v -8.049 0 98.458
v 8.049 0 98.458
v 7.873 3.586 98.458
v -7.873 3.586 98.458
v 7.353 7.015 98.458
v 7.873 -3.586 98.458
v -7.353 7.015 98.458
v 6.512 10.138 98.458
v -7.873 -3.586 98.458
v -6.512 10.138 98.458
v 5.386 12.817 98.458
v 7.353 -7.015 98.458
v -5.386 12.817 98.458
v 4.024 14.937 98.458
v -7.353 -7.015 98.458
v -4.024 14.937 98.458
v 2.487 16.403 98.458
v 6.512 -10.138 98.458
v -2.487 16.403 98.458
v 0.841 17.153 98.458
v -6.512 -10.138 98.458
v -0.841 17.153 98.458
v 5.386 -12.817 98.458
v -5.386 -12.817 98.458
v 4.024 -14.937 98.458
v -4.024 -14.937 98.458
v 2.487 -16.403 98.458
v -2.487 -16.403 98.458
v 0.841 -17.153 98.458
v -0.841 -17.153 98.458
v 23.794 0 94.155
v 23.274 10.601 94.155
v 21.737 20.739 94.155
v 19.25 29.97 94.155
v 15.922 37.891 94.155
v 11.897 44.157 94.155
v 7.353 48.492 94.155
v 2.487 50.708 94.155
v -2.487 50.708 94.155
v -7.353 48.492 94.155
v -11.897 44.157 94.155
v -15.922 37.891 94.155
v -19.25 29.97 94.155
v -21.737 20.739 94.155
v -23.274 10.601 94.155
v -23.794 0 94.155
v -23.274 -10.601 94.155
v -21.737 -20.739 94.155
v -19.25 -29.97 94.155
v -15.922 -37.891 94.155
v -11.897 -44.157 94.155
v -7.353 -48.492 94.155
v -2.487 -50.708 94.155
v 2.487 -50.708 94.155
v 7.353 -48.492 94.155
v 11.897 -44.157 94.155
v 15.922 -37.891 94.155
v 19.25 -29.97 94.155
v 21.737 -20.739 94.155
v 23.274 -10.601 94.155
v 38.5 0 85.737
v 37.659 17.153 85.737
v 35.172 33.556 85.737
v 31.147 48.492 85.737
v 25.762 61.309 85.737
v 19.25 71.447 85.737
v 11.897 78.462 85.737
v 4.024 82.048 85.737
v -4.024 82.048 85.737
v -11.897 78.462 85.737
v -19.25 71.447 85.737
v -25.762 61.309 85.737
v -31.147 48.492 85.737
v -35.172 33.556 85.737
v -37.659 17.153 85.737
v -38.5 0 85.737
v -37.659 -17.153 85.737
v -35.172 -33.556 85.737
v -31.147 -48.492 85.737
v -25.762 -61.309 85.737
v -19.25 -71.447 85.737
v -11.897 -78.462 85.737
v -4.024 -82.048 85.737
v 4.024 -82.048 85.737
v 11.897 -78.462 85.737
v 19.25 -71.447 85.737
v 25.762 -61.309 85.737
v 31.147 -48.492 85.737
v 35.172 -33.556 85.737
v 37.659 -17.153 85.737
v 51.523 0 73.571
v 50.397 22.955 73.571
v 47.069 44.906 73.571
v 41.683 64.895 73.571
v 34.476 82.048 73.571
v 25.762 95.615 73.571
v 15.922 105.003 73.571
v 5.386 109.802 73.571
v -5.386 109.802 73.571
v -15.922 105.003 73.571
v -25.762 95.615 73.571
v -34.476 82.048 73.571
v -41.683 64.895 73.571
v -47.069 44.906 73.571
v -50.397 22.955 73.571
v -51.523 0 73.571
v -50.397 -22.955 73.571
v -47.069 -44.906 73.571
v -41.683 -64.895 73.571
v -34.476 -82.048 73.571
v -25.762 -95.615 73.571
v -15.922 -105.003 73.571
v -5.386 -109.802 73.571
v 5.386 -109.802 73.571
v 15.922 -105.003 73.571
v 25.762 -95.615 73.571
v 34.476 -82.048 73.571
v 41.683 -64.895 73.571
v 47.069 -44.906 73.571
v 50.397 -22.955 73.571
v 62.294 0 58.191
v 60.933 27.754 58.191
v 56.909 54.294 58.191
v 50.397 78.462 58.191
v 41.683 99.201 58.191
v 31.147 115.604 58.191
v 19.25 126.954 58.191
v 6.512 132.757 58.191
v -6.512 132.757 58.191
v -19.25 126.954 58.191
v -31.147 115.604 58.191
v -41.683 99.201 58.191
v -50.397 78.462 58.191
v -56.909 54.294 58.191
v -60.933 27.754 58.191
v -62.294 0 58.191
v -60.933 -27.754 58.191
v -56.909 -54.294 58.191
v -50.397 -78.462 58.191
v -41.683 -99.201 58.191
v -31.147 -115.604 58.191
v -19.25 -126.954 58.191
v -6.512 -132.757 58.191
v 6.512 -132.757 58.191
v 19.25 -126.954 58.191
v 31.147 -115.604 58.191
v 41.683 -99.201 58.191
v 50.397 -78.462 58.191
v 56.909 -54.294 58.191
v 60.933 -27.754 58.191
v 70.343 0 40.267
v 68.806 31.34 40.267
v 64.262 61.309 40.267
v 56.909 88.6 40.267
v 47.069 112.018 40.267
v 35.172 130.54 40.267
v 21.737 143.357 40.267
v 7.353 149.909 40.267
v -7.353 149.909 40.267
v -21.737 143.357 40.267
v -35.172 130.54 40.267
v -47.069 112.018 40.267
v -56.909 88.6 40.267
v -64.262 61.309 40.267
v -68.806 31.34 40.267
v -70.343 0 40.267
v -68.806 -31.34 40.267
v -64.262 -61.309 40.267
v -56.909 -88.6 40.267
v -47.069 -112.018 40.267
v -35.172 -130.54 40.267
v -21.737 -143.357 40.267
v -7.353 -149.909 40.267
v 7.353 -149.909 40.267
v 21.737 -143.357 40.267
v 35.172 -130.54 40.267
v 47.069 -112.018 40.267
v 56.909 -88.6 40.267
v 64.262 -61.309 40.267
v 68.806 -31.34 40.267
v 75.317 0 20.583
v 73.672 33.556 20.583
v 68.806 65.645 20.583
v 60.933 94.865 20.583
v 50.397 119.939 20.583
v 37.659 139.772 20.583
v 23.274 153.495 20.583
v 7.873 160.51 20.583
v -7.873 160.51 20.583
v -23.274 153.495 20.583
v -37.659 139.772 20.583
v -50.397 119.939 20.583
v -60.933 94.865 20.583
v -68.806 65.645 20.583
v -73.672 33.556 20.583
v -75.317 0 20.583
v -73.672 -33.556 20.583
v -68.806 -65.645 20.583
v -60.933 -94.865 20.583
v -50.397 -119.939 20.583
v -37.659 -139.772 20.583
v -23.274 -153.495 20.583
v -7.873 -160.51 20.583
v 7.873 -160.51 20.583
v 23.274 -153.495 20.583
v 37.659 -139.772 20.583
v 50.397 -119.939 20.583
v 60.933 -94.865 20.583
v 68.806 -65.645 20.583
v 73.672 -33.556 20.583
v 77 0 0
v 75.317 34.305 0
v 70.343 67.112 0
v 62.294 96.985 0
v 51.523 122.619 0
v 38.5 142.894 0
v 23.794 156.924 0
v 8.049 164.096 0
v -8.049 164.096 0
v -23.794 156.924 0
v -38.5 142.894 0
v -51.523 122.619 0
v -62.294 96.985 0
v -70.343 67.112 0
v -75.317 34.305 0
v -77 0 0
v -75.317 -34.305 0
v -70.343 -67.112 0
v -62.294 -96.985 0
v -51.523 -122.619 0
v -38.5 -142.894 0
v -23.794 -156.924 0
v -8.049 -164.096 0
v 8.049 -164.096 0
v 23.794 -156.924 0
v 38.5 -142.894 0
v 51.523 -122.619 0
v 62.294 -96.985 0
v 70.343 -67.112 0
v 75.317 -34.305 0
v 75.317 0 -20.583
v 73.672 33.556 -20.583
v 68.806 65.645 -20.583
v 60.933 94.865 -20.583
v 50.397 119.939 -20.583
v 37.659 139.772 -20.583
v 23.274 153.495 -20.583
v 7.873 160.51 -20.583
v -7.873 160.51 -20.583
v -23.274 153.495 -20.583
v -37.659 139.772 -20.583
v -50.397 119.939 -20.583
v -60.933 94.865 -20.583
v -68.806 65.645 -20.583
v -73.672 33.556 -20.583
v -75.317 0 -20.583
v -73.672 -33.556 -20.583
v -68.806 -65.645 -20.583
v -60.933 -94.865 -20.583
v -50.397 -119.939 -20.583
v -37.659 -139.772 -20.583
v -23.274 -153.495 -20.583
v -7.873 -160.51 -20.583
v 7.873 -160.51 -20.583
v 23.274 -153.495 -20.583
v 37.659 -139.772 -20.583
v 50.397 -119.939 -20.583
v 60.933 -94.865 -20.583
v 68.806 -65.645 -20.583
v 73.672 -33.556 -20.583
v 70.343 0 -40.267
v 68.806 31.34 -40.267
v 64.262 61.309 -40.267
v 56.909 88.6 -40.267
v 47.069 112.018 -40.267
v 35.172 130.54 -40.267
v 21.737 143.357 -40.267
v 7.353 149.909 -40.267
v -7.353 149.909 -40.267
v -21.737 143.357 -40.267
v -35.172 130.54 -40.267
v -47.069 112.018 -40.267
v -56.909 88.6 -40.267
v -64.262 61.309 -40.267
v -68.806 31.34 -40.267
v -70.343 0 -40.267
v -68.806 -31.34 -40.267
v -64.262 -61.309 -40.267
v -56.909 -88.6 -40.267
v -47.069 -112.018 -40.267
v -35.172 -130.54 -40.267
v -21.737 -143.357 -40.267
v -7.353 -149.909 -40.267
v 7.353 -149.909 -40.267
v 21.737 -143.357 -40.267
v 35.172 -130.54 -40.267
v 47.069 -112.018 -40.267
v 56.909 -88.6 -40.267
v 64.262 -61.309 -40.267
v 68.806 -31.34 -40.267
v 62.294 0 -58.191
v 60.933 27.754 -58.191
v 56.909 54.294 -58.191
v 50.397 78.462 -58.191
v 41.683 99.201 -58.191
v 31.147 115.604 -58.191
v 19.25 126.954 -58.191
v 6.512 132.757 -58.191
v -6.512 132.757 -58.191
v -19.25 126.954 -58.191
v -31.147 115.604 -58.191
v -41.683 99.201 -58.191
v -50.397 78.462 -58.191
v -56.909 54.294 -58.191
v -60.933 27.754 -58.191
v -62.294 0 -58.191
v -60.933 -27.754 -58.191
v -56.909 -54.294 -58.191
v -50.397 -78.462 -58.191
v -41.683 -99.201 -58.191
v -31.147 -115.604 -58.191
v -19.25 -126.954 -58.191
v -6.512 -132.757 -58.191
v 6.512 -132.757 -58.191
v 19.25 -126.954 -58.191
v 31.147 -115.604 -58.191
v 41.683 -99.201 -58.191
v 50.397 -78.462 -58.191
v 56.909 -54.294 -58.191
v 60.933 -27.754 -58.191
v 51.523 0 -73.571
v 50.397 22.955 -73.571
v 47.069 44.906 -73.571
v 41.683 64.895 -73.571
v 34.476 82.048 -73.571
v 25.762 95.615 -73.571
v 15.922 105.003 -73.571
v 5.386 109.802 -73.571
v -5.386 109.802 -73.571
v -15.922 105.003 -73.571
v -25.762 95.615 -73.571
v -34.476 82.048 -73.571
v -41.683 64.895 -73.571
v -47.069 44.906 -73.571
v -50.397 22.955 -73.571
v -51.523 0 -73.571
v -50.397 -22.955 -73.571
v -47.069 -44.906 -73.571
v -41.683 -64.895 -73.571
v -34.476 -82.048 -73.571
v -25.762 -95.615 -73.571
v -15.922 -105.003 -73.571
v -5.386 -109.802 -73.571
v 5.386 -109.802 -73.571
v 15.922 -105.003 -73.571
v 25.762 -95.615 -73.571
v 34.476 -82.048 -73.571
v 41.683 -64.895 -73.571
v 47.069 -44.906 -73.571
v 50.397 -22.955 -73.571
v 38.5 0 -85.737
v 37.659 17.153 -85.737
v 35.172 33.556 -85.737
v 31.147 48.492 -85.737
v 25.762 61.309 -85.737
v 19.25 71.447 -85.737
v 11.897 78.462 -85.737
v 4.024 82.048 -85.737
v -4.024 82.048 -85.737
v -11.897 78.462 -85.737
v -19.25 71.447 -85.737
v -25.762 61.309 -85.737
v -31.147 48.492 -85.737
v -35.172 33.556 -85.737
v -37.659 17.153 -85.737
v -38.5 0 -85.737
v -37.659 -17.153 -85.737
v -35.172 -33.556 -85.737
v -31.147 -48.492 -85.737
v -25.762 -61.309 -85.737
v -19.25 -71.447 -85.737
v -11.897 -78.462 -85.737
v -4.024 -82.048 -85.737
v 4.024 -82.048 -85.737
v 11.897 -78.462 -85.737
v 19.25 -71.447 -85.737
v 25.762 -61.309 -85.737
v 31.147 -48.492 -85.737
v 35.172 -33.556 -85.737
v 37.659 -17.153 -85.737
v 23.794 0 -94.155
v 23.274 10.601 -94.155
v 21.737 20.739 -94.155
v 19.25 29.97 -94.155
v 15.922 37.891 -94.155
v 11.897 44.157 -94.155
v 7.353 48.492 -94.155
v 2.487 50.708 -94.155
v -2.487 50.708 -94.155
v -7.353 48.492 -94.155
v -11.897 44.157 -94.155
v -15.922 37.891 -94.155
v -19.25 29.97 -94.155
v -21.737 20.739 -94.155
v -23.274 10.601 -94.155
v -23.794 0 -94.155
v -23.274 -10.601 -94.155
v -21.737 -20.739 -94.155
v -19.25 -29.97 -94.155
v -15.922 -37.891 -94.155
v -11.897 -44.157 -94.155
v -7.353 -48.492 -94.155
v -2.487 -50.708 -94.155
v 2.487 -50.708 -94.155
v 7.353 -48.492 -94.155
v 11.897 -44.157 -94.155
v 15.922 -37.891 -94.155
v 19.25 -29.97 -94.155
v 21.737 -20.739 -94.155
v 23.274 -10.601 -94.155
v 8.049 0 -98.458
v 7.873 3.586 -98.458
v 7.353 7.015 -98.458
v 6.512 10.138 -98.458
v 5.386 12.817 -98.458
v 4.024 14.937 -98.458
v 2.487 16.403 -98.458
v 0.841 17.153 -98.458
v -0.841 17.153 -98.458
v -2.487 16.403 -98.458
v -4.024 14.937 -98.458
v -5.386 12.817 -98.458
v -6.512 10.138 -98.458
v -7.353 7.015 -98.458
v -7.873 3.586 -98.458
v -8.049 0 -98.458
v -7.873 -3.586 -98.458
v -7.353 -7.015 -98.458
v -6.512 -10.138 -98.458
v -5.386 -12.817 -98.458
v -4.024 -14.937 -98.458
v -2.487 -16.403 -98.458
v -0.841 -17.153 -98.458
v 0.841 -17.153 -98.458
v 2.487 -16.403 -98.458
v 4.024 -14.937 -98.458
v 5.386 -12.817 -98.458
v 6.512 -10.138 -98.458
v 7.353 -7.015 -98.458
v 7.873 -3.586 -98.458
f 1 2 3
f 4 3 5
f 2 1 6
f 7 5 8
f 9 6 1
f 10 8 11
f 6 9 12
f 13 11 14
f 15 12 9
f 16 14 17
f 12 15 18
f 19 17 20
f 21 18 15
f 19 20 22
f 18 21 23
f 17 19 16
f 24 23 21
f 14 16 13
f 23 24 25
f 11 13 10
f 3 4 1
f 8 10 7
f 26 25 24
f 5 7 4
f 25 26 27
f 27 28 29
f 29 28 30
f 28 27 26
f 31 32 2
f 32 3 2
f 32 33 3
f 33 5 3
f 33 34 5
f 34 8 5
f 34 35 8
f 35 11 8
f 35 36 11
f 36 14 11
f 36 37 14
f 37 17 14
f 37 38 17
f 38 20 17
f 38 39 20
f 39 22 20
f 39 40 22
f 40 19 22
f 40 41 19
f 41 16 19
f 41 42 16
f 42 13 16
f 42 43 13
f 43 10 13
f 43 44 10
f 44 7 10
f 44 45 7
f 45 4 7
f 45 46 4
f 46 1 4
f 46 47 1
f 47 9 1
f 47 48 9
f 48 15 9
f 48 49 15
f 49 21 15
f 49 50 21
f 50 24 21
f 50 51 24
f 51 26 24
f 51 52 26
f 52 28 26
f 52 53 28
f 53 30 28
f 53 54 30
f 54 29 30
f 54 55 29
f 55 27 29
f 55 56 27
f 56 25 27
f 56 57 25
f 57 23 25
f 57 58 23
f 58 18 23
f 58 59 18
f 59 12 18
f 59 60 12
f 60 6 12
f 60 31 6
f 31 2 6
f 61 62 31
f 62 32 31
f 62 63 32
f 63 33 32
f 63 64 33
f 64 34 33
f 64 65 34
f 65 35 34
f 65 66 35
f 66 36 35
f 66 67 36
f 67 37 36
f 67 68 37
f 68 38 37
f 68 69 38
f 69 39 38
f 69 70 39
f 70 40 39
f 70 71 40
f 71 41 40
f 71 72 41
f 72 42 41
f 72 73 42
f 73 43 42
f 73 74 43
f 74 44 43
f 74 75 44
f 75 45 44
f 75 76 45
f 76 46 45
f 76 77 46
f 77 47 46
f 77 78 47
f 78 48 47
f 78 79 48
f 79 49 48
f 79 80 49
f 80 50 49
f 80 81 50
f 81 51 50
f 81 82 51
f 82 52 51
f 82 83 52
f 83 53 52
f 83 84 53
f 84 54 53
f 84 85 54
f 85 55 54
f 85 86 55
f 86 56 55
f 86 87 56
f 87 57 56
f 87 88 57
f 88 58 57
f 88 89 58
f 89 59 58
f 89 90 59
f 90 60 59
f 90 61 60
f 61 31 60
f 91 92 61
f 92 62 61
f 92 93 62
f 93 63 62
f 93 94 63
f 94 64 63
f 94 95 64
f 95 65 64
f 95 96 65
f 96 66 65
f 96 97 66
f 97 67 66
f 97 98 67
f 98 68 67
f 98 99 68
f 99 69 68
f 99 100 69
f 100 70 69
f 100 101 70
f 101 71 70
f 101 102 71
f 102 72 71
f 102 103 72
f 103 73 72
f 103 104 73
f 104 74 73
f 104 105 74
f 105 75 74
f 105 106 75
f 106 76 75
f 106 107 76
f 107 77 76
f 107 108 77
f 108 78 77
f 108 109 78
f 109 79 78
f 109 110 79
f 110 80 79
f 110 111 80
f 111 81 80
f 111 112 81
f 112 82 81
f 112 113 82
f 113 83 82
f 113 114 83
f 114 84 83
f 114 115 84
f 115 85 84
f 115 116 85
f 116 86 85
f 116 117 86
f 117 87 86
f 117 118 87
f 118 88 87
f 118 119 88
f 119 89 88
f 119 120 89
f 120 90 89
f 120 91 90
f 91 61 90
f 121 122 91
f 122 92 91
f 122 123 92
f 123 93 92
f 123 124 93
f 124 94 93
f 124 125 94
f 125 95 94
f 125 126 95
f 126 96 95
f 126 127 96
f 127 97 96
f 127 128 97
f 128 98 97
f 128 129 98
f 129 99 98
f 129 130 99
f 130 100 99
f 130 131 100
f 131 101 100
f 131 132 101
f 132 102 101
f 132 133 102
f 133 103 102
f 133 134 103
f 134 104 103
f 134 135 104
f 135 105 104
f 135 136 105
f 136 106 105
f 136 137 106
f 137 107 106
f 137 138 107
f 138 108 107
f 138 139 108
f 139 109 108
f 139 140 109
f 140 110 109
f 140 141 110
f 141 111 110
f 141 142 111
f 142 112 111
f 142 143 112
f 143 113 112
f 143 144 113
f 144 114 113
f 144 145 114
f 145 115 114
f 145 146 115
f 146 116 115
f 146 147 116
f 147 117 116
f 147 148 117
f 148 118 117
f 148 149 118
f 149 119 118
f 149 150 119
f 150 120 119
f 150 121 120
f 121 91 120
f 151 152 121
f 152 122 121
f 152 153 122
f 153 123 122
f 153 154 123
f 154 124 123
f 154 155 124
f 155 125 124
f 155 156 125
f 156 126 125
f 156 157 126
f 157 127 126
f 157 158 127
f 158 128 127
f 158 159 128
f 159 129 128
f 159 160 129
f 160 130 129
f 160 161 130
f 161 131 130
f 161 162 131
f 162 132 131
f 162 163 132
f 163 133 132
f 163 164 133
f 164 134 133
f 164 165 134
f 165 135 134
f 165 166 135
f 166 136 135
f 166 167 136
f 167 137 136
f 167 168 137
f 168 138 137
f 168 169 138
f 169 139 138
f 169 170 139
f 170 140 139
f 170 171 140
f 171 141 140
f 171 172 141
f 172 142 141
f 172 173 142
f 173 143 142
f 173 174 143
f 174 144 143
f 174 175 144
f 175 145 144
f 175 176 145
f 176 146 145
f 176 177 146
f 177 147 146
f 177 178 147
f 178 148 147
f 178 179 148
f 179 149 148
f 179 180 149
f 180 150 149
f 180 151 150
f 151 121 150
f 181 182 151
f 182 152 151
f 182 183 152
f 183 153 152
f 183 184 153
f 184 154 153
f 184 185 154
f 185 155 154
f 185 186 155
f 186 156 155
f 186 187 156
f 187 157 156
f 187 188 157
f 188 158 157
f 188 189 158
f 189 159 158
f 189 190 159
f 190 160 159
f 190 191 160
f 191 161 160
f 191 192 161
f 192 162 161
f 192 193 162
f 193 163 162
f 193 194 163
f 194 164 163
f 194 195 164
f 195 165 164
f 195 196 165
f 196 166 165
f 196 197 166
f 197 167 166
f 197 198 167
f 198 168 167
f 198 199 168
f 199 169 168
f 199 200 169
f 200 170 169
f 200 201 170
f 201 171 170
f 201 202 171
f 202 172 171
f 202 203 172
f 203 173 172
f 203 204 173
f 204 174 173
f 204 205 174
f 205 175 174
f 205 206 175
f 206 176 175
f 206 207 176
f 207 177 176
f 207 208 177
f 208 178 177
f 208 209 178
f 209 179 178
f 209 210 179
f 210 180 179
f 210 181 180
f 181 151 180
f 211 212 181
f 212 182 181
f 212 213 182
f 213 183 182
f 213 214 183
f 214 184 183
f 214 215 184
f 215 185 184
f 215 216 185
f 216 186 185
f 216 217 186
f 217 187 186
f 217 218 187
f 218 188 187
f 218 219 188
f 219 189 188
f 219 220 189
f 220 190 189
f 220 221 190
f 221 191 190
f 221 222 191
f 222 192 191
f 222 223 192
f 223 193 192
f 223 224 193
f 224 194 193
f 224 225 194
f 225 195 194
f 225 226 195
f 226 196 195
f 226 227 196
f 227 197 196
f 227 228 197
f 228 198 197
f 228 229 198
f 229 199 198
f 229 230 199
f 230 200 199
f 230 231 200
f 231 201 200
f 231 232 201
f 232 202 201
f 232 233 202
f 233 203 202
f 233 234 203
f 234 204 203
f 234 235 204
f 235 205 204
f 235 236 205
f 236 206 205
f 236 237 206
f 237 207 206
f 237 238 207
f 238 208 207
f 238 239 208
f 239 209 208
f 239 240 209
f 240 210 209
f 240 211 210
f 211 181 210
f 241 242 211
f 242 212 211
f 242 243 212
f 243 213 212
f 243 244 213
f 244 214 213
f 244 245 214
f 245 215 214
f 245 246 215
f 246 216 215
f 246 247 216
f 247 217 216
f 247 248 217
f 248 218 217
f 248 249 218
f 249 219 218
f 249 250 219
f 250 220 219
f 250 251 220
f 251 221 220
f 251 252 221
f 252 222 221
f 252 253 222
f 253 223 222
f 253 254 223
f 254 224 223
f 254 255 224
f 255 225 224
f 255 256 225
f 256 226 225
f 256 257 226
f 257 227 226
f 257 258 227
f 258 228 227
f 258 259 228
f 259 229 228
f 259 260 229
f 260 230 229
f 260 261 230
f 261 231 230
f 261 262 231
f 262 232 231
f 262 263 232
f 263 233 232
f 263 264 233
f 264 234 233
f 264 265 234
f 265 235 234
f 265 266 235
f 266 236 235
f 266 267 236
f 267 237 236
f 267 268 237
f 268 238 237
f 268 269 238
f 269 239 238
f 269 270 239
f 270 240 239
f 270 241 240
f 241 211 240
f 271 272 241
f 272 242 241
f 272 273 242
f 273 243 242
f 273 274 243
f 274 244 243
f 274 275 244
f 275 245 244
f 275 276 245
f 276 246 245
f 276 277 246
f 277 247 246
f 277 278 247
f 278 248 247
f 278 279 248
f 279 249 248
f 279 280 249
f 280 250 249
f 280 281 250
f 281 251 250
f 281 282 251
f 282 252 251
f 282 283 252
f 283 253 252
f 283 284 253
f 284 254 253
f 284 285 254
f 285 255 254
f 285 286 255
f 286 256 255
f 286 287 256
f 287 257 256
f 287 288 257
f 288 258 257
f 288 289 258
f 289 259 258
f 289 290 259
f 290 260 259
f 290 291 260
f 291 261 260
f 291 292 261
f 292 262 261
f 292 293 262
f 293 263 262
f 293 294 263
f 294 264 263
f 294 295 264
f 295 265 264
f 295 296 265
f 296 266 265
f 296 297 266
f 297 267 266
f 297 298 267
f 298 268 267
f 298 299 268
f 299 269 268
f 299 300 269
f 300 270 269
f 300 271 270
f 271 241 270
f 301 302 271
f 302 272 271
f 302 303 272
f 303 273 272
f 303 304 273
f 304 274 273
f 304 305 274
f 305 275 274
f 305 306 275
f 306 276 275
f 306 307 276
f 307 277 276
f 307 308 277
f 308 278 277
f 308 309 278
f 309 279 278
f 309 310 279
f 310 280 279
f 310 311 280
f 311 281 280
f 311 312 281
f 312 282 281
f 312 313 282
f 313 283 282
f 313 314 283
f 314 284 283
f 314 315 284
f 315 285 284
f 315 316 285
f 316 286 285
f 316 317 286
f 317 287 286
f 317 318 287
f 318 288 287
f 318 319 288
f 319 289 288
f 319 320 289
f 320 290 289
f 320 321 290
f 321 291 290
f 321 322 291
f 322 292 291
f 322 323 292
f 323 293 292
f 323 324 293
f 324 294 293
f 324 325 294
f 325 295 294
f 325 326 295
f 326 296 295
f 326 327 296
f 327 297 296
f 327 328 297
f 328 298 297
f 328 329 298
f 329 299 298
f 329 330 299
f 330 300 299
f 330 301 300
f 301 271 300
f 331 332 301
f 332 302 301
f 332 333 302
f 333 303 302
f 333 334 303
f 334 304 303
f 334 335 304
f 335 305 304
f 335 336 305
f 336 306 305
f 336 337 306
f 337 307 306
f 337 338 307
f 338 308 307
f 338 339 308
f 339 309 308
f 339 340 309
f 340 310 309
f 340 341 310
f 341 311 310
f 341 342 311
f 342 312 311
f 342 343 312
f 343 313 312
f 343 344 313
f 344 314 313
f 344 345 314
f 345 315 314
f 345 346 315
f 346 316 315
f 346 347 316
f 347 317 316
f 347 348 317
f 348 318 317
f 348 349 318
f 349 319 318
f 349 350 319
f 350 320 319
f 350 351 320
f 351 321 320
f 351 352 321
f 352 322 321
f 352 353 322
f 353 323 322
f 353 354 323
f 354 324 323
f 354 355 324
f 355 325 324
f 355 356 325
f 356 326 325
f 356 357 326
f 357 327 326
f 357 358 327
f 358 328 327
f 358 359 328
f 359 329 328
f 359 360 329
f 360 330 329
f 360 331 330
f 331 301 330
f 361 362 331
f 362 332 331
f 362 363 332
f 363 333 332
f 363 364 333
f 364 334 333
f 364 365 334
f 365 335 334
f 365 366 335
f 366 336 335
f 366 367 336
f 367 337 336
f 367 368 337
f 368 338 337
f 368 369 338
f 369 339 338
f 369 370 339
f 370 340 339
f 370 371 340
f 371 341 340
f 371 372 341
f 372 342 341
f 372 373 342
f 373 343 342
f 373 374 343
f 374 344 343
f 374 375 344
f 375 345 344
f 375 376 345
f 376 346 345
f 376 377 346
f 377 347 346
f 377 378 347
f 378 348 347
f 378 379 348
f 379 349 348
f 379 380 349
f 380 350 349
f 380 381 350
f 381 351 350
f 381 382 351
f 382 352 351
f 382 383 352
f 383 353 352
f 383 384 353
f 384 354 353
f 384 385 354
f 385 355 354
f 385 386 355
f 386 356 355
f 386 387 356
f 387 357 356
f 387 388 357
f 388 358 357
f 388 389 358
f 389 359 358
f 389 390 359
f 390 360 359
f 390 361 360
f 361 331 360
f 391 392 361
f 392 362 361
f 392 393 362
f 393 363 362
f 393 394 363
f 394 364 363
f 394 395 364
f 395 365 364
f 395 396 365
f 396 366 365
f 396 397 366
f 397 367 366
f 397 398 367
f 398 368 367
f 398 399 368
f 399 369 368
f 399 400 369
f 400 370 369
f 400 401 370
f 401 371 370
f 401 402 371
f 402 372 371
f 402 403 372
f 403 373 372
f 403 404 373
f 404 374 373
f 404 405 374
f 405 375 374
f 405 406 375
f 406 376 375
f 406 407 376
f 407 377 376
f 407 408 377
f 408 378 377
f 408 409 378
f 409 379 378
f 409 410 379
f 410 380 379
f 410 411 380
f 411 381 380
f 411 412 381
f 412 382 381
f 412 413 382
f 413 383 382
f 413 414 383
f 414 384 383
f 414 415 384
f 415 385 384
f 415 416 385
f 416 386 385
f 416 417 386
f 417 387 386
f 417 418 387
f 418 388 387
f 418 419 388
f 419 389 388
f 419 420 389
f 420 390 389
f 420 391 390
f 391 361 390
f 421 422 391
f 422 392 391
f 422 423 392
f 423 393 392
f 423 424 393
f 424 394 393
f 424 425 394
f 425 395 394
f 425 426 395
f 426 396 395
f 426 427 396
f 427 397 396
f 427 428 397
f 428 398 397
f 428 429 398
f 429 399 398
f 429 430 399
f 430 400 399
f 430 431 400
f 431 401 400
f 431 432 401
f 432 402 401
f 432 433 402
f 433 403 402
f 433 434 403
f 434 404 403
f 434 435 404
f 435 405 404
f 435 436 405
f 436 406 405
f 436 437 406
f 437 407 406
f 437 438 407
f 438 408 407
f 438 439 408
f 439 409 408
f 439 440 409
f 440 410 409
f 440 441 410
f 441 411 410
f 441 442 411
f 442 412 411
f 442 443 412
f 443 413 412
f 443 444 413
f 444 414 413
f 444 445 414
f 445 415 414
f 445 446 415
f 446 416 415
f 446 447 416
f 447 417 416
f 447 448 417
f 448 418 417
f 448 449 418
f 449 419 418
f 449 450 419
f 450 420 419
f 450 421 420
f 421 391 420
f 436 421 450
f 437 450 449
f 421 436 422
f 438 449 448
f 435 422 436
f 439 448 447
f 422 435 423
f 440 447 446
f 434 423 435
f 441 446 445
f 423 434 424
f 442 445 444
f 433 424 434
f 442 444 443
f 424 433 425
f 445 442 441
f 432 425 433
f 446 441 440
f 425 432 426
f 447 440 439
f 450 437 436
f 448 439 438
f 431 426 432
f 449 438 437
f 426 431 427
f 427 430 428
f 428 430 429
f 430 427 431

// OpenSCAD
// Generated by SolidPython 1.0.1 on 2020-07-29 00:46:48


scale(v = [7, 15, 9]) {
	sphere(r = 11);
}
/***********************************************
*********      SolidPython code:      **********
************************************************
 
# import packages: SolidPython
from solid import *
from solid.utils import *
from itertools import chain, combinations, permutations


class Resize:

    def __init__(self, scad_file):
        self.scad_file = scad_file
        #self.scad_file = import_scad(scad_file)
        # cone/cylinder param:
        self.r1 = 0
        self.r2 = 0
        self.h = 0
        # rectangular prism param:
        self.w = 0
        self.l = 0
        # ellipse param:
        self.r = 0

    # import OpenScad code (file name corresponds to shape)


    # classify shape + parameters
    def assign(self, param1, param2, param3):
        if self.scad_file == 'cone.scad':
            self.r1 = param1
            self.r2 = param2
            self.h = param3
        elif self.scad_file == 'cylinder.scad':
            self.r1 = param1
            self.r2 = param2
            self.h = param3
        elif self.scad_file == 'rectangularPrism.scad':
            self.h = param1
            self.l = param2
            self.w = param3
        else:
            self.r = param1
            self.h = param2

    # resize parameters
    def iterate(self):
        x = range(3, 20, 2)
        i = 1
        if self.scad_file == 'cone.scad':
            tempList = list(permutations(x, 2))
            for temp in tempList:
                param1 = temp[0]
                param2 = temp[1]
                filepath = 'produced_scad_files/' + 'cone' + str(param1) + '_' + str(param2) + '_' + '.scad'
                scad_render_to_file(cylinder(h=param1, r1=param2, r2=0), filepath)

        elif self.scad_file == 'cylinder.scad':
            tempList = list(permutations(x, 3))
            for temp in tempList:
                param1 = temp[0]
                param2 = temp[1]
                filepath = 'produced_scad_files/' + 'cylinder' + str(param1) + '_' + str(param2) + '_' + '.scad'
                scad_render_to_file(cylinder(h=param1, r1=param2, r2=param2), filepath)

        elif self.scad_file == 'rectangularPrism.scad':
            tempList = list(permutations(x, 3))
            for temp in tempList:
                param1 = temp[0]
                param2 = temp[1]
                param3 = temp[2]
                filepath = 'produced_scad_files/' + 'rectangularPrism' + str(param1) + '_' + str(param2) + '_' + str(
                    param3) + '.scad'
                scad_render_to_file(cube(size=(param1, param2, param3)), filepath)

        elif self.scad_file == 'ellipse.scad':
            tempList = list(permutations(x, 4))
            for temp in tempList:
                param1 = temp[0]
                param2 = temp[1]
                param3 = temp[2]
                param4 = temp[3]
                filepath = 'produced_scad_files/' + 'ellipse' + str(param1) + '_' + str(param2) + '_' + str(param3) + '_' + str(param4) + '.scad'
                scad_render_to_file(scale([param1, param2, param3])(sphere(r=param4)), filepath)

    def render_to_scadfile(self):
        scad_render_to_file(scad, 'example.scad') 
 
************************************************/
